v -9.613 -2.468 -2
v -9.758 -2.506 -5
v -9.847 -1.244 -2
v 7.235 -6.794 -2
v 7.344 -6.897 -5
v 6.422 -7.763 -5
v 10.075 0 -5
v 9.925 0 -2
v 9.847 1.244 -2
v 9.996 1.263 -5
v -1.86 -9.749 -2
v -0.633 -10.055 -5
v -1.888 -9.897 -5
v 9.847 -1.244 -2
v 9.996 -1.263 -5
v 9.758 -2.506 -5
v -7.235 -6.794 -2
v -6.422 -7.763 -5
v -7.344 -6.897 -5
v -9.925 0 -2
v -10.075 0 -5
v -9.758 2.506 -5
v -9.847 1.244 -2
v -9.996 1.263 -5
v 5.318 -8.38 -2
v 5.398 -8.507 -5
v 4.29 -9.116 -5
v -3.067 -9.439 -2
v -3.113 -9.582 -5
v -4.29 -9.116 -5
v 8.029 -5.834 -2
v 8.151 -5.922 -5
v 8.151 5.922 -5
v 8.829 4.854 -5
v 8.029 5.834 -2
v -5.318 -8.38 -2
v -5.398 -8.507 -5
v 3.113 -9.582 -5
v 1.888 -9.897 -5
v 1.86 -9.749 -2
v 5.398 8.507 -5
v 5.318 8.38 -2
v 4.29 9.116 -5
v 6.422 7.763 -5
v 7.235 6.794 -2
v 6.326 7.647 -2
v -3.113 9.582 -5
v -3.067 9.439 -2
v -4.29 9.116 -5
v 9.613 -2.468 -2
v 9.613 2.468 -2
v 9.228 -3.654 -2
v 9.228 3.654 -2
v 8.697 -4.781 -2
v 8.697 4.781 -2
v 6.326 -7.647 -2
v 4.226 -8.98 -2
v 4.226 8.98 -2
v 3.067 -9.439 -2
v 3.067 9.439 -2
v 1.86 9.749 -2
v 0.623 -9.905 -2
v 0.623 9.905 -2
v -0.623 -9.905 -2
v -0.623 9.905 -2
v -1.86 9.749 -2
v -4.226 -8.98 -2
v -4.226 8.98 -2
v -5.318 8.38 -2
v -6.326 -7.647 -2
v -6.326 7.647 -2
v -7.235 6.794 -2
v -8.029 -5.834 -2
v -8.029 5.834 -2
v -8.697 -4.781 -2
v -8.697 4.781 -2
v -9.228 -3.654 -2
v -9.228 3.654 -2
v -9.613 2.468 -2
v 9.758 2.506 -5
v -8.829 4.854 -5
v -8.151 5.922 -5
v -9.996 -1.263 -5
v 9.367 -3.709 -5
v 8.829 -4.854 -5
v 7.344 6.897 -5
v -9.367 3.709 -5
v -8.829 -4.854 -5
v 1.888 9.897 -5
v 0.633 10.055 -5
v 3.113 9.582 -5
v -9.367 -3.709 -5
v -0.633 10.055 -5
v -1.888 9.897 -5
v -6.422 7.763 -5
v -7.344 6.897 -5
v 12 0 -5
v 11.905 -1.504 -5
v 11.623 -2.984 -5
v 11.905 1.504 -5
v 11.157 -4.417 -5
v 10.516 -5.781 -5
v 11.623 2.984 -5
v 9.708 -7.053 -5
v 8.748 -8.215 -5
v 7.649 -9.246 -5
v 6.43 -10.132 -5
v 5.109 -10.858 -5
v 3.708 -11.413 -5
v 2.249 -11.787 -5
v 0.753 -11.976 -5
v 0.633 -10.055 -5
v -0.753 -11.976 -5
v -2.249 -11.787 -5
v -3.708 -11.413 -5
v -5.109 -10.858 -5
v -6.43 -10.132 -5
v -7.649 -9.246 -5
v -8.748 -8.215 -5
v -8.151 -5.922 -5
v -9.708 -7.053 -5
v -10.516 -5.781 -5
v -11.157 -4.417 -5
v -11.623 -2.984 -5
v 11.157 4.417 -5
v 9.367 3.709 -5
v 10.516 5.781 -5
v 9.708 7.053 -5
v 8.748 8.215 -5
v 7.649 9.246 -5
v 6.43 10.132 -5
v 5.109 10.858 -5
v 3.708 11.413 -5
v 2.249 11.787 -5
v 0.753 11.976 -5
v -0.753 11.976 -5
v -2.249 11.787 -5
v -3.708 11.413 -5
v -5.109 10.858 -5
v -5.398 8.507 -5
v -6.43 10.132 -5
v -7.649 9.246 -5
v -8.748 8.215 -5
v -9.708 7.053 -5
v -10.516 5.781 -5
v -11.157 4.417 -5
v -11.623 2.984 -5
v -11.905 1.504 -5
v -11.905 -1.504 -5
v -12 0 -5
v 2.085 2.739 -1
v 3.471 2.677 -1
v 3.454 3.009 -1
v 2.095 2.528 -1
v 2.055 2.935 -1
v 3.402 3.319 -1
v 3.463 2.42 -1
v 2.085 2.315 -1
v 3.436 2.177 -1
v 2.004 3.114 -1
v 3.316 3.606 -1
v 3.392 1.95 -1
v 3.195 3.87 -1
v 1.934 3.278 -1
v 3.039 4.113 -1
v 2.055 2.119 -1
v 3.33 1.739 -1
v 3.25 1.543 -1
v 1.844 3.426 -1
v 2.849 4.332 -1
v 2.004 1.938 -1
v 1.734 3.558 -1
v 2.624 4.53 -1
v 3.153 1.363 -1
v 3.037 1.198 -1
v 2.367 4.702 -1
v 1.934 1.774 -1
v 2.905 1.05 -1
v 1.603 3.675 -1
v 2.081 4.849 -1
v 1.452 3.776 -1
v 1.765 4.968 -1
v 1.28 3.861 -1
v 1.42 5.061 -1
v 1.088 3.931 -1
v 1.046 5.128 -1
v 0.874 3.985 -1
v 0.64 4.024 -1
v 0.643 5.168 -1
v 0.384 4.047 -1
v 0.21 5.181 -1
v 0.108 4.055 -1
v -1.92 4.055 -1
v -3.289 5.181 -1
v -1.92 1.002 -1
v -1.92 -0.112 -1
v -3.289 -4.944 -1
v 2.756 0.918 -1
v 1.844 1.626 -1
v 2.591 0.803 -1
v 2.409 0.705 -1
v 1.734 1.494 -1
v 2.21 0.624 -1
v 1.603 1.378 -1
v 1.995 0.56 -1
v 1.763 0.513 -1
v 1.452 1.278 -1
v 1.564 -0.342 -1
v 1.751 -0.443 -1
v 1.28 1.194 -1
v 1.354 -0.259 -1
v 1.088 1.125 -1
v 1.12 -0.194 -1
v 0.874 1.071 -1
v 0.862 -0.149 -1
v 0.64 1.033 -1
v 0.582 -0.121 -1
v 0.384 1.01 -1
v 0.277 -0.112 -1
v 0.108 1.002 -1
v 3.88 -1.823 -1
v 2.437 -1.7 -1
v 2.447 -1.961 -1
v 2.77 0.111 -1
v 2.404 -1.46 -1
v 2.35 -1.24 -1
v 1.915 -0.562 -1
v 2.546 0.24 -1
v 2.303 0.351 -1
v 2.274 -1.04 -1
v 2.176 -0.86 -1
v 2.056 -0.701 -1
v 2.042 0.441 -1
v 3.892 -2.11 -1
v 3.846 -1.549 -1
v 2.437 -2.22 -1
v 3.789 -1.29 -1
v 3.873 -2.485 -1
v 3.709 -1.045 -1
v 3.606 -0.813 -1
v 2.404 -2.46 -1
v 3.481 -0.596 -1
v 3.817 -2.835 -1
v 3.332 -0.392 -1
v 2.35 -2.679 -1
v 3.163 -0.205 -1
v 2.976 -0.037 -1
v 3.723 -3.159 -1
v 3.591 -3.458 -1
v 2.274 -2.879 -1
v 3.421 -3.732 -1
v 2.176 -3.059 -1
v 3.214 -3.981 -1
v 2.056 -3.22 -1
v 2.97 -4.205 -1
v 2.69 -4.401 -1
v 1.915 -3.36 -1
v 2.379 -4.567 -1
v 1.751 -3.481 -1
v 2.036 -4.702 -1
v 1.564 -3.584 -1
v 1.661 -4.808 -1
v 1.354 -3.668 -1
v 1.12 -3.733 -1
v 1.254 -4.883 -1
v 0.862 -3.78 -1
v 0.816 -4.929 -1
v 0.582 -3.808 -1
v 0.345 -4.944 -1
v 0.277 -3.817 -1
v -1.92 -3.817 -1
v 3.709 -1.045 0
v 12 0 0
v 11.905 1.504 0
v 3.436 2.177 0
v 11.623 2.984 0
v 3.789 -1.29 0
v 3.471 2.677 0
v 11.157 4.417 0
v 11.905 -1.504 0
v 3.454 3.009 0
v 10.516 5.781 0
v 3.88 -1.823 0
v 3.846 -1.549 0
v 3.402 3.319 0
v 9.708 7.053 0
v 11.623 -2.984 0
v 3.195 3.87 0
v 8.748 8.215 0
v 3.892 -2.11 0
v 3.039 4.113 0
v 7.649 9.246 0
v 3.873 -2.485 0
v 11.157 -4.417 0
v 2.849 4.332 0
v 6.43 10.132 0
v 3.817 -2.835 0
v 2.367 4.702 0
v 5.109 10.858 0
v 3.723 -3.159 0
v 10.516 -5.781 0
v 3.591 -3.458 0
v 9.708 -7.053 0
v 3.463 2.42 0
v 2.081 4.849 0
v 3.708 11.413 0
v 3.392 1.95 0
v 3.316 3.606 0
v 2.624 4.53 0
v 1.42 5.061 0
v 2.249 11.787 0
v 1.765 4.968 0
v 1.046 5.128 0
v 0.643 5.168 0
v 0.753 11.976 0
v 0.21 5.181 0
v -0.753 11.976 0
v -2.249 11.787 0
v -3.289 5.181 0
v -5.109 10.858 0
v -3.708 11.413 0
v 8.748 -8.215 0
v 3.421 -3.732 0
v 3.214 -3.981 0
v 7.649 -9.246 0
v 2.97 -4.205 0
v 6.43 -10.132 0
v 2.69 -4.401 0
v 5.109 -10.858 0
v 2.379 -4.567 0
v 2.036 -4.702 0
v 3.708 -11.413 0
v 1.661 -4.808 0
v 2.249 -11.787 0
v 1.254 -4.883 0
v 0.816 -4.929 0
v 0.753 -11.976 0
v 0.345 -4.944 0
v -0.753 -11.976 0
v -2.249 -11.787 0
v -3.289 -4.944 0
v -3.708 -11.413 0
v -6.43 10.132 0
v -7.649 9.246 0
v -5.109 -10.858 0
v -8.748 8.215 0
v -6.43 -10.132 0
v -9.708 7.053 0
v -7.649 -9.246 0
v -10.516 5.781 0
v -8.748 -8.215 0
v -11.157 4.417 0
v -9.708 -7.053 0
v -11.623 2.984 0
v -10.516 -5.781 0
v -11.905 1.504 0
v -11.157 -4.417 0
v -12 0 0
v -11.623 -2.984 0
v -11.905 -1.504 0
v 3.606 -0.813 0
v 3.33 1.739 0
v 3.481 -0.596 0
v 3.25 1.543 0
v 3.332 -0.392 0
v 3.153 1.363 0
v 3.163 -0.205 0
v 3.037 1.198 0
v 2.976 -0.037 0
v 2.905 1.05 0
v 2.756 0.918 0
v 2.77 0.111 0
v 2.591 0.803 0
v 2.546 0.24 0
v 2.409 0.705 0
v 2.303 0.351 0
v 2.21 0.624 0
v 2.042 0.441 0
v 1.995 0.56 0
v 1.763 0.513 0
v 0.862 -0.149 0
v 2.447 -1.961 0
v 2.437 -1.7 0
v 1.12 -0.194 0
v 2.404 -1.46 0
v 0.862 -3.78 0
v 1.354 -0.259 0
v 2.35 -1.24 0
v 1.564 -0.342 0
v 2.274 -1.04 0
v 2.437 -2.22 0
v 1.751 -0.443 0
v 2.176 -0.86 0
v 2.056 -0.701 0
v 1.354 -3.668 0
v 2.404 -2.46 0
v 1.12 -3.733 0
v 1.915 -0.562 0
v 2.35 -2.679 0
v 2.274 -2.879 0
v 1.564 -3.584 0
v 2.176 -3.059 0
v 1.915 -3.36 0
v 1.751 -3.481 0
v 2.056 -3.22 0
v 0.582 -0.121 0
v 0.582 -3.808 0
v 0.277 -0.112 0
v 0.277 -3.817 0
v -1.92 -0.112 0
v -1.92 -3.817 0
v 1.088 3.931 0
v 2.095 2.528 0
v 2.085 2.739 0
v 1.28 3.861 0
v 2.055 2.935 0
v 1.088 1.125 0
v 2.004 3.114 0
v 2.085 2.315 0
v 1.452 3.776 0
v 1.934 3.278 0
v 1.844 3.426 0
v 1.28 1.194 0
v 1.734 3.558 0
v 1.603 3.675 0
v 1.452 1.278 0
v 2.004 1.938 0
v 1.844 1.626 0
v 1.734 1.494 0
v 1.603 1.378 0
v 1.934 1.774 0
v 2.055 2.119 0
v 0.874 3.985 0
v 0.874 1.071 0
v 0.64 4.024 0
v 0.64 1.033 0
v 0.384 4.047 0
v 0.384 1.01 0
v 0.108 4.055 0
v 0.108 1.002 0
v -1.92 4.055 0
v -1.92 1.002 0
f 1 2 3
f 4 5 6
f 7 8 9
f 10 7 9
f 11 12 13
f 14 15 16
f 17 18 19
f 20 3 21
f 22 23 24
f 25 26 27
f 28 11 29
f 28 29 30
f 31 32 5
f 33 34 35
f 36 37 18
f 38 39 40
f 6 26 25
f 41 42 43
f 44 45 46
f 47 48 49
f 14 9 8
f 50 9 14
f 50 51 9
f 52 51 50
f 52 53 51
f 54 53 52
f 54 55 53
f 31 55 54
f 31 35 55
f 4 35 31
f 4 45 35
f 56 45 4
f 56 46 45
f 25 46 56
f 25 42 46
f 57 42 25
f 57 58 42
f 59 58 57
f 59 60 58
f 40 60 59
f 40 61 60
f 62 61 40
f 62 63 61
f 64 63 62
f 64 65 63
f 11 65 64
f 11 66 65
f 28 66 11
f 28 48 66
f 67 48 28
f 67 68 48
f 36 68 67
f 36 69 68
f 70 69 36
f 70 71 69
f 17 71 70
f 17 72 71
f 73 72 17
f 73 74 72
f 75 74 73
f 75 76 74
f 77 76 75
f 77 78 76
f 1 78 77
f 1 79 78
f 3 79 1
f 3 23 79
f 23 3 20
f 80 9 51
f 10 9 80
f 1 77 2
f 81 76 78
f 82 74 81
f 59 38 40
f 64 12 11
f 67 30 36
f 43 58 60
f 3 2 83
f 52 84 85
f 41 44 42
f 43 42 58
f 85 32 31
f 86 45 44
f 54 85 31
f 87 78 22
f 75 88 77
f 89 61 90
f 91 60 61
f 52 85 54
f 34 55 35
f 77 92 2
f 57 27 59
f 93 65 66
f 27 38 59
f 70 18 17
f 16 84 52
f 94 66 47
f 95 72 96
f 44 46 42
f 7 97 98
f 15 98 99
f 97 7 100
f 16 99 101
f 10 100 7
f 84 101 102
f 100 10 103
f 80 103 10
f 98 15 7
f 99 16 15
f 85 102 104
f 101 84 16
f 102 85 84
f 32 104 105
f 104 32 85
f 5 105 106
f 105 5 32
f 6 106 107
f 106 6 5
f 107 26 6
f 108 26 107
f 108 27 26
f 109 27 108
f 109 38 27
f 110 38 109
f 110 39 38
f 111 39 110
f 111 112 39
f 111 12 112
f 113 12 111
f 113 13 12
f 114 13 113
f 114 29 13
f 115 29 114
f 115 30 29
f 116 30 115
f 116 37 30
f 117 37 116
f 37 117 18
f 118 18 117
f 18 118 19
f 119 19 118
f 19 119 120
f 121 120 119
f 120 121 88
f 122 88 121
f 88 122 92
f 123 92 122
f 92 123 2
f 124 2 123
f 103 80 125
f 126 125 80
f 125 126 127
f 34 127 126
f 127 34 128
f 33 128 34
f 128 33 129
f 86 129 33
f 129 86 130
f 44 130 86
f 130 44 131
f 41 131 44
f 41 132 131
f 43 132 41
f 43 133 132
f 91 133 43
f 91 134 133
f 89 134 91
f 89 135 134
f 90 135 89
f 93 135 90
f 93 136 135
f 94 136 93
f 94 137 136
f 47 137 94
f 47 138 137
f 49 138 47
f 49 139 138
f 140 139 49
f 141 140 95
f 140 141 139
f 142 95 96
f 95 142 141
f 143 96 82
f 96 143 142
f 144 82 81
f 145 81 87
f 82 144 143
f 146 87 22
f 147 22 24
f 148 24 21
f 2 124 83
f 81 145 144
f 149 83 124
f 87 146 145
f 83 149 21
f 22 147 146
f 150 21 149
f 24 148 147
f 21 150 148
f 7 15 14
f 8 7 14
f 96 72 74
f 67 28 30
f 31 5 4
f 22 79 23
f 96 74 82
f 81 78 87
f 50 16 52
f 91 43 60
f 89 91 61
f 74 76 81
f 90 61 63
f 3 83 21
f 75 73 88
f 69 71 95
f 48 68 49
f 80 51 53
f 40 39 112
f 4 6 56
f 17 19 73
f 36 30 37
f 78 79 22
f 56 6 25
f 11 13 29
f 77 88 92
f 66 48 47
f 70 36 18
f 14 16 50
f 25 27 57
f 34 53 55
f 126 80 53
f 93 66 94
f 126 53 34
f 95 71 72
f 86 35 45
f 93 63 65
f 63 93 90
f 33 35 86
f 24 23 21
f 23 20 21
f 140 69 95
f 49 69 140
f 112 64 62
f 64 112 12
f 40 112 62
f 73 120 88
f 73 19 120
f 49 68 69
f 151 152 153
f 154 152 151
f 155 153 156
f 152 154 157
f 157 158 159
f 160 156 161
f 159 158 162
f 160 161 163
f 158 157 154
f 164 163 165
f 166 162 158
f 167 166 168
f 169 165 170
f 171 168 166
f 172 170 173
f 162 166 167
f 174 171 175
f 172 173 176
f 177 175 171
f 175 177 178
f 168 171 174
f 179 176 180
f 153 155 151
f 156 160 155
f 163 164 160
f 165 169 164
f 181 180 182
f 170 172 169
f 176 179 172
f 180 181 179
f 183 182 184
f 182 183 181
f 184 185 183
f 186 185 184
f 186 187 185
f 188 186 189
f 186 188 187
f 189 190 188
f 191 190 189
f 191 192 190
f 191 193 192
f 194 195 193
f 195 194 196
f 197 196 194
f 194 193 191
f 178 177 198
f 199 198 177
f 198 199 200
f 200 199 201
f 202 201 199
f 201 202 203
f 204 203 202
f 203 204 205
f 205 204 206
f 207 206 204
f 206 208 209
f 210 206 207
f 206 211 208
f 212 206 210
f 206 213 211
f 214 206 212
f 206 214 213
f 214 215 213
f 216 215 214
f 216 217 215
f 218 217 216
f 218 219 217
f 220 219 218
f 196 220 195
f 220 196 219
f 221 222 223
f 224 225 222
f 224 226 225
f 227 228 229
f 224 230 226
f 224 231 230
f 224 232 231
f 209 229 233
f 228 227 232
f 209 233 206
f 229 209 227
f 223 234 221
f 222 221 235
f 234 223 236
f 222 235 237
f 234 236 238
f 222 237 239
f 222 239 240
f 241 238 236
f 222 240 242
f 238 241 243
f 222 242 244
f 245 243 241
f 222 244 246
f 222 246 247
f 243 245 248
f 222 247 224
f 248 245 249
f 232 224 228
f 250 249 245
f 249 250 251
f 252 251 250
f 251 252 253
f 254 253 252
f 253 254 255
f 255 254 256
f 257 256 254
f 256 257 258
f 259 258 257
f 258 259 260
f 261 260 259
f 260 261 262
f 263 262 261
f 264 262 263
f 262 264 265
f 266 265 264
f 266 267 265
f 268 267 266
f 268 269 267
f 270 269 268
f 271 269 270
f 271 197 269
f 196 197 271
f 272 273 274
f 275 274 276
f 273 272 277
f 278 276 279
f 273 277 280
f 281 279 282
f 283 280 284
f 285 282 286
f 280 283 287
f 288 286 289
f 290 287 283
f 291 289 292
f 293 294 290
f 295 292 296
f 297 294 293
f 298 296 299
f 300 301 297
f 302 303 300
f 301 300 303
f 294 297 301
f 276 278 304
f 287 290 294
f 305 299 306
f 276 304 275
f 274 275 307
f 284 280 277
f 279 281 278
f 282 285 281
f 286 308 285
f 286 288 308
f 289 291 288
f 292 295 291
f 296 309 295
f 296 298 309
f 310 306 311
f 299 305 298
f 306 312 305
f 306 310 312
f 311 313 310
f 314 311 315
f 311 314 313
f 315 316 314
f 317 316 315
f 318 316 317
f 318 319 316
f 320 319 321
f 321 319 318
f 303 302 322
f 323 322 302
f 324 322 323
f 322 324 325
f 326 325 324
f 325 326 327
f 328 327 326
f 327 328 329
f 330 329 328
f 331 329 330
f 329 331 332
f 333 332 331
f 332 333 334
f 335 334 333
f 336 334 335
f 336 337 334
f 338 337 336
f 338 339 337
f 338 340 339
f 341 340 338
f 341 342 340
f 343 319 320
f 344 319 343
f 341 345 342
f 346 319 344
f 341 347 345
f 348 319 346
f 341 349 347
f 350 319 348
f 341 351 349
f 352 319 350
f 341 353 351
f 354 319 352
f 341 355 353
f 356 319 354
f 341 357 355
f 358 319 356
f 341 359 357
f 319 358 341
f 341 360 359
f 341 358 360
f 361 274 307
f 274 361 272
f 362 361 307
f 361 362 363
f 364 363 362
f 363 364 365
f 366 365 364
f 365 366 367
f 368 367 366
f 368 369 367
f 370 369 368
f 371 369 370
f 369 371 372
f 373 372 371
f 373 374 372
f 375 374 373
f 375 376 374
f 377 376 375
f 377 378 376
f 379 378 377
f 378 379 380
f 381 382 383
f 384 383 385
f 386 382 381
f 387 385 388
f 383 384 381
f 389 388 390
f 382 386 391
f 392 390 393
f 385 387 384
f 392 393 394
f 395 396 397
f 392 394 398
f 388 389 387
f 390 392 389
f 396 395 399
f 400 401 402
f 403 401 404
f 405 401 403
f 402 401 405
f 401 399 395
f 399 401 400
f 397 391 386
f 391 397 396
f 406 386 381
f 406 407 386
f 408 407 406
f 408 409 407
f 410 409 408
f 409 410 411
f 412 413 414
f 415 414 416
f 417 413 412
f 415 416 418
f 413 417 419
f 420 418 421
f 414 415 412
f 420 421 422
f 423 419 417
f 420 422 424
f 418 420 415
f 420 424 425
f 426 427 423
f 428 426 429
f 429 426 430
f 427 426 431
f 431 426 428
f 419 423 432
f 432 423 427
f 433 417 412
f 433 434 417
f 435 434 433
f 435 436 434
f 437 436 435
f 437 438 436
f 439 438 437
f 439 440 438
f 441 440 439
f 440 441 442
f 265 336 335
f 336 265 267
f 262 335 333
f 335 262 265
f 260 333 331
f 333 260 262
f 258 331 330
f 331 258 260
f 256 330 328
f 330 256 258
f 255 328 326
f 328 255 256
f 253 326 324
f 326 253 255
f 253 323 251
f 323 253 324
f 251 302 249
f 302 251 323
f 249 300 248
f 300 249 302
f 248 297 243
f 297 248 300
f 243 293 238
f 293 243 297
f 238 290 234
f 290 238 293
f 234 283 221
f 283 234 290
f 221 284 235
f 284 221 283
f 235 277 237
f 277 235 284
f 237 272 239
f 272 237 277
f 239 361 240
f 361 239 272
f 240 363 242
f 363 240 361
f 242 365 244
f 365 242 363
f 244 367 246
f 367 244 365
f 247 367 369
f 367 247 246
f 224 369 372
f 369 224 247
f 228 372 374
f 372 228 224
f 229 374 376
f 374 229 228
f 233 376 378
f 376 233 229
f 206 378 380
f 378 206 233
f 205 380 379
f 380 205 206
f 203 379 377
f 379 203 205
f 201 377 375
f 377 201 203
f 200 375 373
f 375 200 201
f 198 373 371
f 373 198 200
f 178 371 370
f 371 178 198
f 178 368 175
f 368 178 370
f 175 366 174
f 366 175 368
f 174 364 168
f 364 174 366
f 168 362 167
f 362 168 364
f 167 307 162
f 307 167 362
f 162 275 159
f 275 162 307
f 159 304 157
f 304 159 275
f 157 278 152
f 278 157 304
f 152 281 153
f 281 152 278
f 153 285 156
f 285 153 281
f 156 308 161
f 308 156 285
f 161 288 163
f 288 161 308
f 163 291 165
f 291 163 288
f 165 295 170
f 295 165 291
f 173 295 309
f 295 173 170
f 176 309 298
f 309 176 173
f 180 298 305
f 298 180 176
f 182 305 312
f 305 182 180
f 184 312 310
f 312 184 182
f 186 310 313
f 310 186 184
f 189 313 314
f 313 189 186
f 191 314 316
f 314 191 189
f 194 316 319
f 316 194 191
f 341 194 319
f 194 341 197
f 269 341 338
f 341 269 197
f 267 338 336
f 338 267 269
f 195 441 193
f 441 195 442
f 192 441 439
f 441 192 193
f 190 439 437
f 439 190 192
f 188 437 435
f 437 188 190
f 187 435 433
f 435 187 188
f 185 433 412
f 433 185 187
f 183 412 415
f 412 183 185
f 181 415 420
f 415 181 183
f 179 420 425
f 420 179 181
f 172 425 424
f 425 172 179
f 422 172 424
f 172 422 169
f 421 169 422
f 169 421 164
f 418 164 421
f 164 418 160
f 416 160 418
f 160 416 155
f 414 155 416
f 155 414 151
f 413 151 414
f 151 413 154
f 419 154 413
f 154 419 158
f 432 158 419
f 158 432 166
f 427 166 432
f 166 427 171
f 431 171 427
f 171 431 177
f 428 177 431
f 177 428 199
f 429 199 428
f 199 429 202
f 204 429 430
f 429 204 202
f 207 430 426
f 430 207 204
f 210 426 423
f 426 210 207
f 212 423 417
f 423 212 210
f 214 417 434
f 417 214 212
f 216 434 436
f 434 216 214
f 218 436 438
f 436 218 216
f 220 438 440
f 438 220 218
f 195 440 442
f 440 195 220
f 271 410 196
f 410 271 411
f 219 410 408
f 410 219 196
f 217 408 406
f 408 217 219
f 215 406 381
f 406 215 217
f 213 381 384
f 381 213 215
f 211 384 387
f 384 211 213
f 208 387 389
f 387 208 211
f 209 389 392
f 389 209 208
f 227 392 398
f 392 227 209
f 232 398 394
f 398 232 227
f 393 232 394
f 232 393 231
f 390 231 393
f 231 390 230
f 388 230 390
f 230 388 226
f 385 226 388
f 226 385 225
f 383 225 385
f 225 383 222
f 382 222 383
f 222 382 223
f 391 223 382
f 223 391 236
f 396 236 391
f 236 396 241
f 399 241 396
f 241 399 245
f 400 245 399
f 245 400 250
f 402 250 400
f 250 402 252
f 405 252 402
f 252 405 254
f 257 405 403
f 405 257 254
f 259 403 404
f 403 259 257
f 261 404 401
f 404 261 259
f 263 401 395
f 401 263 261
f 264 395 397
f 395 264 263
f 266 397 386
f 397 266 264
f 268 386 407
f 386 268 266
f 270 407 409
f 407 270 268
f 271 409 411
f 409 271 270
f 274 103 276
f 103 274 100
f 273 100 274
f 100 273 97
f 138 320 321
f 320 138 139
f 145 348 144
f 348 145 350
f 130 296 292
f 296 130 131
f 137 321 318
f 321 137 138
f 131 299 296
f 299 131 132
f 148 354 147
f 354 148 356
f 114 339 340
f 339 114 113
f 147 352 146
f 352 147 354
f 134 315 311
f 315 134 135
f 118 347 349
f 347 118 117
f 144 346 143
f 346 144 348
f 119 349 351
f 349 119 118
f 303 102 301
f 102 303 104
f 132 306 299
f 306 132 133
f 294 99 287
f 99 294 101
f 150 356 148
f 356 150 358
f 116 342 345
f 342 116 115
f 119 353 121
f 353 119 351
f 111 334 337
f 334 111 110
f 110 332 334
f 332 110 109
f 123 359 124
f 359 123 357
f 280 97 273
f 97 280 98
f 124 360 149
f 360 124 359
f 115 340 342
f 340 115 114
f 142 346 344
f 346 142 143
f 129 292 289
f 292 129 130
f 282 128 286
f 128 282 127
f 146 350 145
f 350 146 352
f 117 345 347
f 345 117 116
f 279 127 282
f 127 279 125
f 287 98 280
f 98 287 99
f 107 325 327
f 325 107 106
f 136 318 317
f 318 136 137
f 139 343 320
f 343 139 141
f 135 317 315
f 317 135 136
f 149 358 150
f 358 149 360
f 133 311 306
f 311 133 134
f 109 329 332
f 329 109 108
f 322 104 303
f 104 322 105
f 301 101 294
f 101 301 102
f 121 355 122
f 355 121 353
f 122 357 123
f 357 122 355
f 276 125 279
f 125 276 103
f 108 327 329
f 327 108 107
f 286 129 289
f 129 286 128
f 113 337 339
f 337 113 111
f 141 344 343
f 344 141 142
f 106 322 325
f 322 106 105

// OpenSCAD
$fn = 50;

difference() {
	union() {
		translate(v = [0, 0, -5.0]) {
			cylinder(h = 5, r = 12.0);
		}
	}
	union() {
		#translate(v = [0, 0, -5.0]) {
			cylinder(h = 3, r1 = 10.075, r2 = 9.925);
		}
		translate(v = [0, 0, -1]) {
			linear_extrude(height = 1) {
				text(font = "Impact", halign = "center", size = 10, text = "B", valign = "center");
			}
		}
	}
}
